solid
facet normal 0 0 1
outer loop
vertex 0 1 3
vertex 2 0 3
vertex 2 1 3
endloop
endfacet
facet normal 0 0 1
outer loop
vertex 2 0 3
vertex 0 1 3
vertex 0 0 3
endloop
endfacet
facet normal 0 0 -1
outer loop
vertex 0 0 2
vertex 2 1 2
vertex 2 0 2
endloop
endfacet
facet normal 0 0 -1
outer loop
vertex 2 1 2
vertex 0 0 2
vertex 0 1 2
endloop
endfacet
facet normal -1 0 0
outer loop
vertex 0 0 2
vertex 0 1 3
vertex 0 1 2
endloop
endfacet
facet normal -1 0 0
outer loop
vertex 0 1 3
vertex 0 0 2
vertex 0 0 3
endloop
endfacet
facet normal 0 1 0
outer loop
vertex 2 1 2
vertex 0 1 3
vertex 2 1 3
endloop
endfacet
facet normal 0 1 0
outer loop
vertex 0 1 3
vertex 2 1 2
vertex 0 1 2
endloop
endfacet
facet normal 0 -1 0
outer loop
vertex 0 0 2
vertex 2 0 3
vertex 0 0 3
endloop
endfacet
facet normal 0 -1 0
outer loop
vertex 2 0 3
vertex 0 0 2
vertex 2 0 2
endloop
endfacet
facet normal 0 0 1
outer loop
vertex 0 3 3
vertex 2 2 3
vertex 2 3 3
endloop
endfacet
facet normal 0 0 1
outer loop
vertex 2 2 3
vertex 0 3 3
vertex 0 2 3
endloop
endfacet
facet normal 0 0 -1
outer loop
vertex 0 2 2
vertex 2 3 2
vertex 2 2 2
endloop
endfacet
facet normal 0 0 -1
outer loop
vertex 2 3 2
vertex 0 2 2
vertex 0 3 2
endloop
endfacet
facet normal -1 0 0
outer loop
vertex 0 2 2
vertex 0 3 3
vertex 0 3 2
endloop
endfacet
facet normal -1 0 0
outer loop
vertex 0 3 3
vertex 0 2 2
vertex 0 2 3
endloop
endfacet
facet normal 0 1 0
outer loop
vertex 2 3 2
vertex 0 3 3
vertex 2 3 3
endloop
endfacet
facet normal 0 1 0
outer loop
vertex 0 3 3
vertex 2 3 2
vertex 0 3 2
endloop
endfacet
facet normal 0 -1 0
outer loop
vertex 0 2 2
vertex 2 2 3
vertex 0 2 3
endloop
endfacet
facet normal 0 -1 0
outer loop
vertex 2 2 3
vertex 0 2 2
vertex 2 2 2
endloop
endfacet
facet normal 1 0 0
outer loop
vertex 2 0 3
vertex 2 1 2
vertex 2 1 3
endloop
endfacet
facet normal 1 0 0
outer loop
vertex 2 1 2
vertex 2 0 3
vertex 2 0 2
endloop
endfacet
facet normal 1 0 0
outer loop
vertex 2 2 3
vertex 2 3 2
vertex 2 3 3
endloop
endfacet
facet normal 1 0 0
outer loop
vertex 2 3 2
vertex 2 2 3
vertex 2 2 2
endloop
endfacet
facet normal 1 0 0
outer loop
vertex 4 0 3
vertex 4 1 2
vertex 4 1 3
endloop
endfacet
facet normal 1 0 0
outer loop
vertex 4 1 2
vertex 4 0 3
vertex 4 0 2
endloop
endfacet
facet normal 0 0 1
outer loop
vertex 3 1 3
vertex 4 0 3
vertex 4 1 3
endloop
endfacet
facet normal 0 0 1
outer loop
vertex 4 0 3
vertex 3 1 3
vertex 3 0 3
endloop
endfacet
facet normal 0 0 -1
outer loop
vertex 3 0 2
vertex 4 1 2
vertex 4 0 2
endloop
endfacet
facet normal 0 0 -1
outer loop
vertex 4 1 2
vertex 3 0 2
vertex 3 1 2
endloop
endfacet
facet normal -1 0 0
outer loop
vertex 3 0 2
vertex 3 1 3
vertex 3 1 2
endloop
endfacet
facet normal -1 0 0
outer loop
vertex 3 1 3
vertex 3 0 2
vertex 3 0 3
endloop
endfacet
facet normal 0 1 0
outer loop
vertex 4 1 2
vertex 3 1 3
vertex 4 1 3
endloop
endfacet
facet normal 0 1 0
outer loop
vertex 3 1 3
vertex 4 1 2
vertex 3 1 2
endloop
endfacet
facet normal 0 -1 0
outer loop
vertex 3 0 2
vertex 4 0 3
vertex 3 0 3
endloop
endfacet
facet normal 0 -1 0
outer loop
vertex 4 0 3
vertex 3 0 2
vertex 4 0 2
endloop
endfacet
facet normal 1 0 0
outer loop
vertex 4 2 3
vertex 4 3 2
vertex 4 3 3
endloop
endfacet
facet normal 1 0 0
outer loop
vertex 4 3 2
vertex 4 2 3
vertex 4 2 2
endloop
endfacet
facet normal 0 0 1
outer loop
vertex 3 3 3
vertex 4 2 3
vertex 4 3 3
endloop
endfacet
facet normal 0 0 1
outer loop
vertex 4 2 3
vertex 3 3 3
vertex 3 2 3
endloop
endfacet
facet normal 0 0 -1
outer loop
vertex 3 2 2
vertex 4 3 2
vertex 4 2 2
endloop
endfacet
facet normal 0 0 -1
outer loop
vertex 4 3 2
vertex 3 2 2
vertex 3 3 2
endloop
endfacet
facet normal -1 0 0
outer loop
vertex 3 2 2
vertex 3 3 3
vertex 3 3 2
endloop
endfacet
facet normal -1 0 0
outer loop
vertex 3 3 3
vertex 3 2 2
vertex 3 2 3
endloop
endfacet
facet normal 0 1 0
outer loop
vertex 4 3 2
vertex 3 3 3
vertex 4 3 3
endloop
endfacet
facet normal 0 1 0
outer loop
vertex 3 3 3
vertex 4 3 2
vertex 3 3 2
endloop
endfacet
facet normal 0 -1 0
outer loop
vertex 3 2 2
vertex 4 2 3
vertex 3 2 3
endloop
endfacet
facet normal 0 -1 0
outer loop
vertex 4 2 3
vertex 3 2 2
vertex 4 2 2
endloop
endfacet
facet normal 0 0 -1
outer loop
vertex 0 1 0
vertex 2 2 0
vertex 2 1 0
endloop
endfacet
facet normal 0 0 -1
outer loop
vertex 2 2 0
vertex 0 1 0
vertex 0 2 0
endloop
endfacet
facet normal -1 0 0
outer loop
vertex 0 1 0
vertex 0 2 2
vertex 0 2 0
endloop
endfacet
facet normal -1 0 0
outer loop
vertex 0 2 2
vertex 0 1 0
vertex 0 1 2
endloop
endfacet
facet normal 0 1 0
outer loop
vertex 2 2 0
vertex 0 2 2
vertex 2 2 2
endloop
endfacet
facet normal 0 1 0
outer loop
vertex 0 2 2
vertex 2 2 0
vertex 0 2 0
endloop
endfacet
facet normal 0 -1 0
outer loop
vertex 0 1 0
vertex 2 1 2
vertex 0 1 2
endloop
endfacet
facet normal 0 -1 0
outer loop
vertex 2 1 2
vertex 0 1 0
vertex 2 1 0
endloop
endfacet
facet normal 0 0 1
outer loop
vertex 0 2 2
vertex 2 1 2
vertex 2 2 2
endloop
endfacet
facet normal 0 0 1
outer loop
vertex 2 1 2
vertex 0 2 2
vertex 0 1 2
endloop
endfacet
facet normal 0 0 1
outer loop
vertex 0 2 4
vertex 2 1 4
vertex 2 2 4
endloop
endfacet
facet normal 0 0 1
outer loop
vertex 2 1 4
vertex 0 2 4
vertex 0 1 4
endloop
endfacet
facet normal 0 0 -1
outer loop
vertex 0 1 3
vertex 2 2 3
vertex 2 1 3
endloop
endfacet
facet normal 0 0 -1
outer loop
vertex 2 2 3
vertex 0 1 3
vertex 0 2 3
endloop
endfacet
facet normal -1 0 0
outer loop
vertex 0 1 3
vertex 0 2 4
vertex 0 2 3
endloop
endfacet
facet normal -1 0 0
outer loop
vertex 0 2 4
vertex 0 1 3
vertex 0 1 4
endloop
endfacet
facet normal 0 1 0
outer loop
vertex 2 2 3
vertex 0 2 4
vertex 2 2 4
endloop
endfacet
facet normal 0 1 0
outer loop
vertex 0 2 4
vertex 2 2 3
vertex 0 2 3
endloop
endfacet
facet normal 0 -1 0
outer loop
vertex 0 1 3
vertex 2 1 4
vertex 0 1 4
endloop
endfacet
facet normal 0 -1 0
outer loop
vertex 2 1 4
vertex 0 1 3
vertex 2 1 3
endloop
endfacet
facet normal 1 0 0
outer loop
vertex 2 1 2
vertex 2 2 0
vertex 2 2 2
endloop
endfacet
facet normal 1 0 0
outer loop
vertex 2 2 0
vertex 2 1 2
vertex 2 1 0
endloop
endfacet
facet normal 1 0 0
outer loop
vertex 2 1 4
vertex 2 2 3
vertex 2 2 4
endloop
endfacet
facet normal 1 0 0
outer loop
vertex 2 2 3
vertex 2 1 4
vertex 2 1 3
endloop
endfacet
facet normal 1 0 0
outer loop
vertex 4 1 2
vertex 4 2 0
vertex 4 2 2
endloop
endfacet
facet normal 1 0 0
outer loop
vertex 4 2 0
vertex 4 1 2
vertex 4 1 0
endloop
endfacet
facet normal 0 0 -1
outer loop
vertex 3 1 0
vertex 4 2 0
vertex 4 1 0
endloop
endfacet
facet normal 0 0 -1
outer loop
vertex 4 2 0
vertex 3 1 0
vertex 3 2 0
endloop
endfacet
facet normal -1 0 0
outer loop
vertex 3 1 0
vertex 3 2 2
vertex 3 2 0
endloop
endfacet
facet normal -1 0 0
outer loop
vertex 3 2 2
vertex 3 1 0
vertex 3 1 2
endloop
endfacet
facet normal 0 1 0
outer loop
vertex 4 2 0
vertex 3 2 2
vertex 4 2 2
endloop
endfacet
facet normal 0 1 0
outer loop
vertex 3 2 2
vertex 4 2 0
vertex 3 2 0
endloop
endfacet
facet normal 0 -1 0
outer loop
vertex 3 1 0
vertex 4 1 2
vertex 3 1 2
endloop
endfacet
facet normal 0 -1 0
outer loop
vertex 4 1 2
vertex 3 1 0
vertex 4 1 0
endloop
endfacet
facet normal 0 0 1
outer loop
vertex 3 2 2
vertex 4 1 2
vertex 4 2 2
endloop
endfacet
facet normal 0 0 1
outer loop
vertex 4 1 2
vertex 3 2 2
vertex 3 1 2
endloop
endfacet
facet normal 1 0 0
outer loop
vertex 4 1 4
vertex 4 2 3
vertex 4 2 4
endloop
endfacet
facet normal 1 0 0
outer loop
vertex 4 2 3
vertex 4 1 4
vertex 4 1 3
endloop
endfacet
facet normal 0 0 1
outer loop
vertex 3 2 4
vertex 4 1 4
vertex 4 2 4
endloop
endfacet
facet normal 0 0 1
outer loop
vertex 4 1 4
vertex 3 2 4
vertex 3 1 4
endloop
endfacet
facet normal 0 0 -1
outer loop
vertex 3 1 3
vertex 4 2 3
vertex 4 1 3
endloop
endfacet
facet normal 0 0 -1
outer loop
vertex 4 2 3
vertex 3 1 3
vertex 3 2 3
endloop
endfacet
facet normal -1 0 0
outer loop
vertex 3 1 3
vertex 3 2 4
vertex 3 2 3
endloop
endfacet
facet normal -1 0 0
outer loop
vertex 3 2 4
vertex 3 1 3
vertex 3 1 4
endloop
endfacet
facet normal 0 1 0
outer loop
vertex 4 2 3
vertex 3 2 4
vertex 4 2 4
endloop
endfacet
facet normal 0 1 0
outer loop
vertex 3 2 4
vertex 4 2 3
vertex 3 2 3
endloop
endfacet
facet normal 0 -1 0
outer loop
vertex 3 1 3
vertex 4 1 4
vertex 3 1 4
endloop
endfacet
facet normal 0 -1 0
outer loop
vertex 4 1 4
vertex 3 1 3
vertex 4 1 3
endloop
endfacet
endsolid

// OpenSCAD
module blueSquare(b, redVals, greenVals) {
	for(r = redVals) {
		for(g = greenVals) {
			translate([r, g, b]) cube(1);
		}
	}
}

module greenSquare(g, redVals, blueVals) {
	for(r = redVals) {
		for(b = blueVals) {
			translate([r, g, b]) cube(1);
		}
	}
}

module redSquare(r, greenVals, blueVals) {
	for(b = blueVals) {
		for(g = greenVals) {
			translate([r, g, b]) cube(1);
		}
	}
}

//blueSquare(0, [0, 2, 3], [0, 1, 2, 3]);
//blueSquare(1, [0, 2, 3], [0, 1, 2, 3]);
//blueSquare(3, [0, 2, 3], [0, 1, 2, 3]);
//redSquare(1, [0, 1, 2, 3], [2]);

blueSquare(2, [0, 1, 3], [0, 2]);
greenSquare(1, [0, 1, 3], [0, 1, 3]);
//redSquare(2, [0, 2, 3], [0, 1, 2, 3]);
//greenSquare(3, [0, 1, 3], [0, 1, 2, 3]);
